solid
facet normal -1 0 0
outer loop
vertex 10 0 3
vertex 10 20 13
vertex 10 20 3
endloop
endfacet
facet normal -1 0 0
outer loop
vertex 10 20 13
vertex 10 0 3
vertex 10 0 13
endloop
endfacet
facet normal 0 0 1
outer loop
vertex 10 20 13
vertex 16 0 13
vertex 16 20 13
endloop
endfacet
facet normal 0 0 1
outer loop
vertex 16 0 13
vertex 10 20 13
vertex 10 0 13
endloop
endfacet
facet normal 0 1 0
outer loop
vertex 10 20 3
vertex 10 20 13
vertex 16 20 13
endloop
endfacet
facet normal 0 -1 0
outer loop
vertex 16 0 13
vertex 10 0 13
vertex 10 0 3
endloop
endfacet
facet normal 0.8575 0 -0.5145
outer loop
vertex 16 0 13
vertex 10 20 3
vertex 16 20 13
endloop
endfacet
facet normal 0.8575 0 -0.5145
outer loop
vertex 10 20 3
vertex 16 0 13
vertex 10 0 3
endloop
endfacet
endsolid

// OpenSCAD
// file: ../lib/lib.scad
function sel(v, indices) = [ for (i = indices) v[i] ];
function eps() = 0.01;

module cmirror(v = [1, 0, 0])
{
	children();
	mirror(v)
		children();
}

module rcube2d
(
	s = [10, 10, 10],
	r = 2,
	singleSided = false,
)
{
	width = s[0];
	depth = s[1];
	height = s[2];

	union()
	{
		cmirror([0, 1, 0])
		cmirror()
		translate([(width - r) / 2, (depth - r) / 2, 0])
		cylinder(h = height, d = r);
		translate([-(width - r) / 2, -depth / 2, 0])
		cube([width - r, depth, height]);
		translate([-width / 2, -(depth - r) / 2, 0])
		cube([width, depth - r, height]);
	}

	if (singleSided)
	{
		translate([-width / 2, -depth / 2, 0])
		cube([width, r, height]);
	}
}

module rcube3d
(
	s = [10, 10, 10],
	r = 2,
	singleSided = false,
)
{
	width = s[0];
	depth = s[1];
	height = s[2];

	w2 = width - r;
	d2 = depth - r;
	h2 = height - r;

	translate([0, 0, r / 2])
	rcube2d([width, depth, h2], r);

	translate([0, 0, height / 2])
	cmirror([0, 0, 1])
	cmirror([0, 1, 0])
	translate([0, d2 / 2, (height - r) / 2])
	translate([-w2 / 2, 0, 0])
	rotate([0, 90, 0])
	cylinder(h = w2, d = r);

	translate([0, 0, height / 2])
	cmirror([0, 0, 1])
	cmirror()
	translate([w2 / 2, 0, h2 / 2])
	translate([0, d2 / 2, 0])
	rotate([90, 0, 0])
	cylinder(h = d2, d = r);

	translate([-w2 / 2, -d2 / 2, 0])
	cube([w2, d2, height]);

	translate([0, 0, height / 2])
	cmirror([0, 0, 1])
	cmirror([0, 1, 0])
	cmirror()
	translate([w2 / 2, d2 / 2, h2 / 2])
	sphere(r / 2);

	if (singleSided)
	{
		translate([0, -depth / 2, height / 2])
		rotate([-90, 0, 0])
		rcube2d([width, height, r], r);
	}
}

module rcube
(
	s = [10, 10, 10],
	r = 2,
	flat = true,
	singleSided = false,
	aX = 0,
	aY = 0,
	aZ = 0,
)
{
	width = s[0];
	depth = s[1];
	height = s[2];

	rw = r > width ? width : r;

	translate
	([
		(1 - aX) * width / 2,
		(1 - aY) * depth / 2,
		-aZ * height / 2
	])
	if (flat)
		rcube2d(s, rw, singleSided);
	else
	{
		rh = rw > height ? height : rw;
		rcube3d(s, rh, singleSided);
	}
}

module chamfer
(
	s = [10, 20, 6],
	p = [0, 0, 0],
	round = true,
	aX = 0,
	aY = 0,
	aZ = 0,
	rotation = 0,
)
{
	width = s[0];
	depth = s[1];
	height = s[2];

	r = width < height ? width : height;

	translate(p)
	rotate([0, rotation * 90, 0])
	translate
	([
		-aX * r / 2,
		-aY * depth / 2,
		-aZ * r / 2
	])
	if (round)
	{
		difference()
		{
			cube(s);

			translate([r, -depth / 2, 0])
			union()
			{
				translate([0, 0, r])
				rotate([-90, 0, 0])
				cylinder(d = 2 * r, h = 2 * depth);

				translate([0, 0, -r / 2])
				cube([2 * width, 2 * depth, 2 * r]);

				translate([-1.5 * r, 0, r])
				cube([2 * r, 2 * depth, 2 * height]);
			}
		}
	}
	else
	{
		difference()
		{
			cube(s);

			translate([0, 1.5 * depth, 0])
			rotate([90, 0, 0])
			linear_extrude(2 * depth)
			polygon
			([
				[ 2 * width, -1 * height],
				[ 2 * width,  2 * height],
				[-1 * width,  2 * height],
			]);
		}
	}
}
// main file
$fa = 1.0;
$fs = 0.4;

use <../lib/lib.scad>

chamfer
(
	[10, 20, 6],
	[10, 10, 10],
	round = false,
	rotation = 1,
	aX = 1,
	aY = 1,
	aZ = 0
);
